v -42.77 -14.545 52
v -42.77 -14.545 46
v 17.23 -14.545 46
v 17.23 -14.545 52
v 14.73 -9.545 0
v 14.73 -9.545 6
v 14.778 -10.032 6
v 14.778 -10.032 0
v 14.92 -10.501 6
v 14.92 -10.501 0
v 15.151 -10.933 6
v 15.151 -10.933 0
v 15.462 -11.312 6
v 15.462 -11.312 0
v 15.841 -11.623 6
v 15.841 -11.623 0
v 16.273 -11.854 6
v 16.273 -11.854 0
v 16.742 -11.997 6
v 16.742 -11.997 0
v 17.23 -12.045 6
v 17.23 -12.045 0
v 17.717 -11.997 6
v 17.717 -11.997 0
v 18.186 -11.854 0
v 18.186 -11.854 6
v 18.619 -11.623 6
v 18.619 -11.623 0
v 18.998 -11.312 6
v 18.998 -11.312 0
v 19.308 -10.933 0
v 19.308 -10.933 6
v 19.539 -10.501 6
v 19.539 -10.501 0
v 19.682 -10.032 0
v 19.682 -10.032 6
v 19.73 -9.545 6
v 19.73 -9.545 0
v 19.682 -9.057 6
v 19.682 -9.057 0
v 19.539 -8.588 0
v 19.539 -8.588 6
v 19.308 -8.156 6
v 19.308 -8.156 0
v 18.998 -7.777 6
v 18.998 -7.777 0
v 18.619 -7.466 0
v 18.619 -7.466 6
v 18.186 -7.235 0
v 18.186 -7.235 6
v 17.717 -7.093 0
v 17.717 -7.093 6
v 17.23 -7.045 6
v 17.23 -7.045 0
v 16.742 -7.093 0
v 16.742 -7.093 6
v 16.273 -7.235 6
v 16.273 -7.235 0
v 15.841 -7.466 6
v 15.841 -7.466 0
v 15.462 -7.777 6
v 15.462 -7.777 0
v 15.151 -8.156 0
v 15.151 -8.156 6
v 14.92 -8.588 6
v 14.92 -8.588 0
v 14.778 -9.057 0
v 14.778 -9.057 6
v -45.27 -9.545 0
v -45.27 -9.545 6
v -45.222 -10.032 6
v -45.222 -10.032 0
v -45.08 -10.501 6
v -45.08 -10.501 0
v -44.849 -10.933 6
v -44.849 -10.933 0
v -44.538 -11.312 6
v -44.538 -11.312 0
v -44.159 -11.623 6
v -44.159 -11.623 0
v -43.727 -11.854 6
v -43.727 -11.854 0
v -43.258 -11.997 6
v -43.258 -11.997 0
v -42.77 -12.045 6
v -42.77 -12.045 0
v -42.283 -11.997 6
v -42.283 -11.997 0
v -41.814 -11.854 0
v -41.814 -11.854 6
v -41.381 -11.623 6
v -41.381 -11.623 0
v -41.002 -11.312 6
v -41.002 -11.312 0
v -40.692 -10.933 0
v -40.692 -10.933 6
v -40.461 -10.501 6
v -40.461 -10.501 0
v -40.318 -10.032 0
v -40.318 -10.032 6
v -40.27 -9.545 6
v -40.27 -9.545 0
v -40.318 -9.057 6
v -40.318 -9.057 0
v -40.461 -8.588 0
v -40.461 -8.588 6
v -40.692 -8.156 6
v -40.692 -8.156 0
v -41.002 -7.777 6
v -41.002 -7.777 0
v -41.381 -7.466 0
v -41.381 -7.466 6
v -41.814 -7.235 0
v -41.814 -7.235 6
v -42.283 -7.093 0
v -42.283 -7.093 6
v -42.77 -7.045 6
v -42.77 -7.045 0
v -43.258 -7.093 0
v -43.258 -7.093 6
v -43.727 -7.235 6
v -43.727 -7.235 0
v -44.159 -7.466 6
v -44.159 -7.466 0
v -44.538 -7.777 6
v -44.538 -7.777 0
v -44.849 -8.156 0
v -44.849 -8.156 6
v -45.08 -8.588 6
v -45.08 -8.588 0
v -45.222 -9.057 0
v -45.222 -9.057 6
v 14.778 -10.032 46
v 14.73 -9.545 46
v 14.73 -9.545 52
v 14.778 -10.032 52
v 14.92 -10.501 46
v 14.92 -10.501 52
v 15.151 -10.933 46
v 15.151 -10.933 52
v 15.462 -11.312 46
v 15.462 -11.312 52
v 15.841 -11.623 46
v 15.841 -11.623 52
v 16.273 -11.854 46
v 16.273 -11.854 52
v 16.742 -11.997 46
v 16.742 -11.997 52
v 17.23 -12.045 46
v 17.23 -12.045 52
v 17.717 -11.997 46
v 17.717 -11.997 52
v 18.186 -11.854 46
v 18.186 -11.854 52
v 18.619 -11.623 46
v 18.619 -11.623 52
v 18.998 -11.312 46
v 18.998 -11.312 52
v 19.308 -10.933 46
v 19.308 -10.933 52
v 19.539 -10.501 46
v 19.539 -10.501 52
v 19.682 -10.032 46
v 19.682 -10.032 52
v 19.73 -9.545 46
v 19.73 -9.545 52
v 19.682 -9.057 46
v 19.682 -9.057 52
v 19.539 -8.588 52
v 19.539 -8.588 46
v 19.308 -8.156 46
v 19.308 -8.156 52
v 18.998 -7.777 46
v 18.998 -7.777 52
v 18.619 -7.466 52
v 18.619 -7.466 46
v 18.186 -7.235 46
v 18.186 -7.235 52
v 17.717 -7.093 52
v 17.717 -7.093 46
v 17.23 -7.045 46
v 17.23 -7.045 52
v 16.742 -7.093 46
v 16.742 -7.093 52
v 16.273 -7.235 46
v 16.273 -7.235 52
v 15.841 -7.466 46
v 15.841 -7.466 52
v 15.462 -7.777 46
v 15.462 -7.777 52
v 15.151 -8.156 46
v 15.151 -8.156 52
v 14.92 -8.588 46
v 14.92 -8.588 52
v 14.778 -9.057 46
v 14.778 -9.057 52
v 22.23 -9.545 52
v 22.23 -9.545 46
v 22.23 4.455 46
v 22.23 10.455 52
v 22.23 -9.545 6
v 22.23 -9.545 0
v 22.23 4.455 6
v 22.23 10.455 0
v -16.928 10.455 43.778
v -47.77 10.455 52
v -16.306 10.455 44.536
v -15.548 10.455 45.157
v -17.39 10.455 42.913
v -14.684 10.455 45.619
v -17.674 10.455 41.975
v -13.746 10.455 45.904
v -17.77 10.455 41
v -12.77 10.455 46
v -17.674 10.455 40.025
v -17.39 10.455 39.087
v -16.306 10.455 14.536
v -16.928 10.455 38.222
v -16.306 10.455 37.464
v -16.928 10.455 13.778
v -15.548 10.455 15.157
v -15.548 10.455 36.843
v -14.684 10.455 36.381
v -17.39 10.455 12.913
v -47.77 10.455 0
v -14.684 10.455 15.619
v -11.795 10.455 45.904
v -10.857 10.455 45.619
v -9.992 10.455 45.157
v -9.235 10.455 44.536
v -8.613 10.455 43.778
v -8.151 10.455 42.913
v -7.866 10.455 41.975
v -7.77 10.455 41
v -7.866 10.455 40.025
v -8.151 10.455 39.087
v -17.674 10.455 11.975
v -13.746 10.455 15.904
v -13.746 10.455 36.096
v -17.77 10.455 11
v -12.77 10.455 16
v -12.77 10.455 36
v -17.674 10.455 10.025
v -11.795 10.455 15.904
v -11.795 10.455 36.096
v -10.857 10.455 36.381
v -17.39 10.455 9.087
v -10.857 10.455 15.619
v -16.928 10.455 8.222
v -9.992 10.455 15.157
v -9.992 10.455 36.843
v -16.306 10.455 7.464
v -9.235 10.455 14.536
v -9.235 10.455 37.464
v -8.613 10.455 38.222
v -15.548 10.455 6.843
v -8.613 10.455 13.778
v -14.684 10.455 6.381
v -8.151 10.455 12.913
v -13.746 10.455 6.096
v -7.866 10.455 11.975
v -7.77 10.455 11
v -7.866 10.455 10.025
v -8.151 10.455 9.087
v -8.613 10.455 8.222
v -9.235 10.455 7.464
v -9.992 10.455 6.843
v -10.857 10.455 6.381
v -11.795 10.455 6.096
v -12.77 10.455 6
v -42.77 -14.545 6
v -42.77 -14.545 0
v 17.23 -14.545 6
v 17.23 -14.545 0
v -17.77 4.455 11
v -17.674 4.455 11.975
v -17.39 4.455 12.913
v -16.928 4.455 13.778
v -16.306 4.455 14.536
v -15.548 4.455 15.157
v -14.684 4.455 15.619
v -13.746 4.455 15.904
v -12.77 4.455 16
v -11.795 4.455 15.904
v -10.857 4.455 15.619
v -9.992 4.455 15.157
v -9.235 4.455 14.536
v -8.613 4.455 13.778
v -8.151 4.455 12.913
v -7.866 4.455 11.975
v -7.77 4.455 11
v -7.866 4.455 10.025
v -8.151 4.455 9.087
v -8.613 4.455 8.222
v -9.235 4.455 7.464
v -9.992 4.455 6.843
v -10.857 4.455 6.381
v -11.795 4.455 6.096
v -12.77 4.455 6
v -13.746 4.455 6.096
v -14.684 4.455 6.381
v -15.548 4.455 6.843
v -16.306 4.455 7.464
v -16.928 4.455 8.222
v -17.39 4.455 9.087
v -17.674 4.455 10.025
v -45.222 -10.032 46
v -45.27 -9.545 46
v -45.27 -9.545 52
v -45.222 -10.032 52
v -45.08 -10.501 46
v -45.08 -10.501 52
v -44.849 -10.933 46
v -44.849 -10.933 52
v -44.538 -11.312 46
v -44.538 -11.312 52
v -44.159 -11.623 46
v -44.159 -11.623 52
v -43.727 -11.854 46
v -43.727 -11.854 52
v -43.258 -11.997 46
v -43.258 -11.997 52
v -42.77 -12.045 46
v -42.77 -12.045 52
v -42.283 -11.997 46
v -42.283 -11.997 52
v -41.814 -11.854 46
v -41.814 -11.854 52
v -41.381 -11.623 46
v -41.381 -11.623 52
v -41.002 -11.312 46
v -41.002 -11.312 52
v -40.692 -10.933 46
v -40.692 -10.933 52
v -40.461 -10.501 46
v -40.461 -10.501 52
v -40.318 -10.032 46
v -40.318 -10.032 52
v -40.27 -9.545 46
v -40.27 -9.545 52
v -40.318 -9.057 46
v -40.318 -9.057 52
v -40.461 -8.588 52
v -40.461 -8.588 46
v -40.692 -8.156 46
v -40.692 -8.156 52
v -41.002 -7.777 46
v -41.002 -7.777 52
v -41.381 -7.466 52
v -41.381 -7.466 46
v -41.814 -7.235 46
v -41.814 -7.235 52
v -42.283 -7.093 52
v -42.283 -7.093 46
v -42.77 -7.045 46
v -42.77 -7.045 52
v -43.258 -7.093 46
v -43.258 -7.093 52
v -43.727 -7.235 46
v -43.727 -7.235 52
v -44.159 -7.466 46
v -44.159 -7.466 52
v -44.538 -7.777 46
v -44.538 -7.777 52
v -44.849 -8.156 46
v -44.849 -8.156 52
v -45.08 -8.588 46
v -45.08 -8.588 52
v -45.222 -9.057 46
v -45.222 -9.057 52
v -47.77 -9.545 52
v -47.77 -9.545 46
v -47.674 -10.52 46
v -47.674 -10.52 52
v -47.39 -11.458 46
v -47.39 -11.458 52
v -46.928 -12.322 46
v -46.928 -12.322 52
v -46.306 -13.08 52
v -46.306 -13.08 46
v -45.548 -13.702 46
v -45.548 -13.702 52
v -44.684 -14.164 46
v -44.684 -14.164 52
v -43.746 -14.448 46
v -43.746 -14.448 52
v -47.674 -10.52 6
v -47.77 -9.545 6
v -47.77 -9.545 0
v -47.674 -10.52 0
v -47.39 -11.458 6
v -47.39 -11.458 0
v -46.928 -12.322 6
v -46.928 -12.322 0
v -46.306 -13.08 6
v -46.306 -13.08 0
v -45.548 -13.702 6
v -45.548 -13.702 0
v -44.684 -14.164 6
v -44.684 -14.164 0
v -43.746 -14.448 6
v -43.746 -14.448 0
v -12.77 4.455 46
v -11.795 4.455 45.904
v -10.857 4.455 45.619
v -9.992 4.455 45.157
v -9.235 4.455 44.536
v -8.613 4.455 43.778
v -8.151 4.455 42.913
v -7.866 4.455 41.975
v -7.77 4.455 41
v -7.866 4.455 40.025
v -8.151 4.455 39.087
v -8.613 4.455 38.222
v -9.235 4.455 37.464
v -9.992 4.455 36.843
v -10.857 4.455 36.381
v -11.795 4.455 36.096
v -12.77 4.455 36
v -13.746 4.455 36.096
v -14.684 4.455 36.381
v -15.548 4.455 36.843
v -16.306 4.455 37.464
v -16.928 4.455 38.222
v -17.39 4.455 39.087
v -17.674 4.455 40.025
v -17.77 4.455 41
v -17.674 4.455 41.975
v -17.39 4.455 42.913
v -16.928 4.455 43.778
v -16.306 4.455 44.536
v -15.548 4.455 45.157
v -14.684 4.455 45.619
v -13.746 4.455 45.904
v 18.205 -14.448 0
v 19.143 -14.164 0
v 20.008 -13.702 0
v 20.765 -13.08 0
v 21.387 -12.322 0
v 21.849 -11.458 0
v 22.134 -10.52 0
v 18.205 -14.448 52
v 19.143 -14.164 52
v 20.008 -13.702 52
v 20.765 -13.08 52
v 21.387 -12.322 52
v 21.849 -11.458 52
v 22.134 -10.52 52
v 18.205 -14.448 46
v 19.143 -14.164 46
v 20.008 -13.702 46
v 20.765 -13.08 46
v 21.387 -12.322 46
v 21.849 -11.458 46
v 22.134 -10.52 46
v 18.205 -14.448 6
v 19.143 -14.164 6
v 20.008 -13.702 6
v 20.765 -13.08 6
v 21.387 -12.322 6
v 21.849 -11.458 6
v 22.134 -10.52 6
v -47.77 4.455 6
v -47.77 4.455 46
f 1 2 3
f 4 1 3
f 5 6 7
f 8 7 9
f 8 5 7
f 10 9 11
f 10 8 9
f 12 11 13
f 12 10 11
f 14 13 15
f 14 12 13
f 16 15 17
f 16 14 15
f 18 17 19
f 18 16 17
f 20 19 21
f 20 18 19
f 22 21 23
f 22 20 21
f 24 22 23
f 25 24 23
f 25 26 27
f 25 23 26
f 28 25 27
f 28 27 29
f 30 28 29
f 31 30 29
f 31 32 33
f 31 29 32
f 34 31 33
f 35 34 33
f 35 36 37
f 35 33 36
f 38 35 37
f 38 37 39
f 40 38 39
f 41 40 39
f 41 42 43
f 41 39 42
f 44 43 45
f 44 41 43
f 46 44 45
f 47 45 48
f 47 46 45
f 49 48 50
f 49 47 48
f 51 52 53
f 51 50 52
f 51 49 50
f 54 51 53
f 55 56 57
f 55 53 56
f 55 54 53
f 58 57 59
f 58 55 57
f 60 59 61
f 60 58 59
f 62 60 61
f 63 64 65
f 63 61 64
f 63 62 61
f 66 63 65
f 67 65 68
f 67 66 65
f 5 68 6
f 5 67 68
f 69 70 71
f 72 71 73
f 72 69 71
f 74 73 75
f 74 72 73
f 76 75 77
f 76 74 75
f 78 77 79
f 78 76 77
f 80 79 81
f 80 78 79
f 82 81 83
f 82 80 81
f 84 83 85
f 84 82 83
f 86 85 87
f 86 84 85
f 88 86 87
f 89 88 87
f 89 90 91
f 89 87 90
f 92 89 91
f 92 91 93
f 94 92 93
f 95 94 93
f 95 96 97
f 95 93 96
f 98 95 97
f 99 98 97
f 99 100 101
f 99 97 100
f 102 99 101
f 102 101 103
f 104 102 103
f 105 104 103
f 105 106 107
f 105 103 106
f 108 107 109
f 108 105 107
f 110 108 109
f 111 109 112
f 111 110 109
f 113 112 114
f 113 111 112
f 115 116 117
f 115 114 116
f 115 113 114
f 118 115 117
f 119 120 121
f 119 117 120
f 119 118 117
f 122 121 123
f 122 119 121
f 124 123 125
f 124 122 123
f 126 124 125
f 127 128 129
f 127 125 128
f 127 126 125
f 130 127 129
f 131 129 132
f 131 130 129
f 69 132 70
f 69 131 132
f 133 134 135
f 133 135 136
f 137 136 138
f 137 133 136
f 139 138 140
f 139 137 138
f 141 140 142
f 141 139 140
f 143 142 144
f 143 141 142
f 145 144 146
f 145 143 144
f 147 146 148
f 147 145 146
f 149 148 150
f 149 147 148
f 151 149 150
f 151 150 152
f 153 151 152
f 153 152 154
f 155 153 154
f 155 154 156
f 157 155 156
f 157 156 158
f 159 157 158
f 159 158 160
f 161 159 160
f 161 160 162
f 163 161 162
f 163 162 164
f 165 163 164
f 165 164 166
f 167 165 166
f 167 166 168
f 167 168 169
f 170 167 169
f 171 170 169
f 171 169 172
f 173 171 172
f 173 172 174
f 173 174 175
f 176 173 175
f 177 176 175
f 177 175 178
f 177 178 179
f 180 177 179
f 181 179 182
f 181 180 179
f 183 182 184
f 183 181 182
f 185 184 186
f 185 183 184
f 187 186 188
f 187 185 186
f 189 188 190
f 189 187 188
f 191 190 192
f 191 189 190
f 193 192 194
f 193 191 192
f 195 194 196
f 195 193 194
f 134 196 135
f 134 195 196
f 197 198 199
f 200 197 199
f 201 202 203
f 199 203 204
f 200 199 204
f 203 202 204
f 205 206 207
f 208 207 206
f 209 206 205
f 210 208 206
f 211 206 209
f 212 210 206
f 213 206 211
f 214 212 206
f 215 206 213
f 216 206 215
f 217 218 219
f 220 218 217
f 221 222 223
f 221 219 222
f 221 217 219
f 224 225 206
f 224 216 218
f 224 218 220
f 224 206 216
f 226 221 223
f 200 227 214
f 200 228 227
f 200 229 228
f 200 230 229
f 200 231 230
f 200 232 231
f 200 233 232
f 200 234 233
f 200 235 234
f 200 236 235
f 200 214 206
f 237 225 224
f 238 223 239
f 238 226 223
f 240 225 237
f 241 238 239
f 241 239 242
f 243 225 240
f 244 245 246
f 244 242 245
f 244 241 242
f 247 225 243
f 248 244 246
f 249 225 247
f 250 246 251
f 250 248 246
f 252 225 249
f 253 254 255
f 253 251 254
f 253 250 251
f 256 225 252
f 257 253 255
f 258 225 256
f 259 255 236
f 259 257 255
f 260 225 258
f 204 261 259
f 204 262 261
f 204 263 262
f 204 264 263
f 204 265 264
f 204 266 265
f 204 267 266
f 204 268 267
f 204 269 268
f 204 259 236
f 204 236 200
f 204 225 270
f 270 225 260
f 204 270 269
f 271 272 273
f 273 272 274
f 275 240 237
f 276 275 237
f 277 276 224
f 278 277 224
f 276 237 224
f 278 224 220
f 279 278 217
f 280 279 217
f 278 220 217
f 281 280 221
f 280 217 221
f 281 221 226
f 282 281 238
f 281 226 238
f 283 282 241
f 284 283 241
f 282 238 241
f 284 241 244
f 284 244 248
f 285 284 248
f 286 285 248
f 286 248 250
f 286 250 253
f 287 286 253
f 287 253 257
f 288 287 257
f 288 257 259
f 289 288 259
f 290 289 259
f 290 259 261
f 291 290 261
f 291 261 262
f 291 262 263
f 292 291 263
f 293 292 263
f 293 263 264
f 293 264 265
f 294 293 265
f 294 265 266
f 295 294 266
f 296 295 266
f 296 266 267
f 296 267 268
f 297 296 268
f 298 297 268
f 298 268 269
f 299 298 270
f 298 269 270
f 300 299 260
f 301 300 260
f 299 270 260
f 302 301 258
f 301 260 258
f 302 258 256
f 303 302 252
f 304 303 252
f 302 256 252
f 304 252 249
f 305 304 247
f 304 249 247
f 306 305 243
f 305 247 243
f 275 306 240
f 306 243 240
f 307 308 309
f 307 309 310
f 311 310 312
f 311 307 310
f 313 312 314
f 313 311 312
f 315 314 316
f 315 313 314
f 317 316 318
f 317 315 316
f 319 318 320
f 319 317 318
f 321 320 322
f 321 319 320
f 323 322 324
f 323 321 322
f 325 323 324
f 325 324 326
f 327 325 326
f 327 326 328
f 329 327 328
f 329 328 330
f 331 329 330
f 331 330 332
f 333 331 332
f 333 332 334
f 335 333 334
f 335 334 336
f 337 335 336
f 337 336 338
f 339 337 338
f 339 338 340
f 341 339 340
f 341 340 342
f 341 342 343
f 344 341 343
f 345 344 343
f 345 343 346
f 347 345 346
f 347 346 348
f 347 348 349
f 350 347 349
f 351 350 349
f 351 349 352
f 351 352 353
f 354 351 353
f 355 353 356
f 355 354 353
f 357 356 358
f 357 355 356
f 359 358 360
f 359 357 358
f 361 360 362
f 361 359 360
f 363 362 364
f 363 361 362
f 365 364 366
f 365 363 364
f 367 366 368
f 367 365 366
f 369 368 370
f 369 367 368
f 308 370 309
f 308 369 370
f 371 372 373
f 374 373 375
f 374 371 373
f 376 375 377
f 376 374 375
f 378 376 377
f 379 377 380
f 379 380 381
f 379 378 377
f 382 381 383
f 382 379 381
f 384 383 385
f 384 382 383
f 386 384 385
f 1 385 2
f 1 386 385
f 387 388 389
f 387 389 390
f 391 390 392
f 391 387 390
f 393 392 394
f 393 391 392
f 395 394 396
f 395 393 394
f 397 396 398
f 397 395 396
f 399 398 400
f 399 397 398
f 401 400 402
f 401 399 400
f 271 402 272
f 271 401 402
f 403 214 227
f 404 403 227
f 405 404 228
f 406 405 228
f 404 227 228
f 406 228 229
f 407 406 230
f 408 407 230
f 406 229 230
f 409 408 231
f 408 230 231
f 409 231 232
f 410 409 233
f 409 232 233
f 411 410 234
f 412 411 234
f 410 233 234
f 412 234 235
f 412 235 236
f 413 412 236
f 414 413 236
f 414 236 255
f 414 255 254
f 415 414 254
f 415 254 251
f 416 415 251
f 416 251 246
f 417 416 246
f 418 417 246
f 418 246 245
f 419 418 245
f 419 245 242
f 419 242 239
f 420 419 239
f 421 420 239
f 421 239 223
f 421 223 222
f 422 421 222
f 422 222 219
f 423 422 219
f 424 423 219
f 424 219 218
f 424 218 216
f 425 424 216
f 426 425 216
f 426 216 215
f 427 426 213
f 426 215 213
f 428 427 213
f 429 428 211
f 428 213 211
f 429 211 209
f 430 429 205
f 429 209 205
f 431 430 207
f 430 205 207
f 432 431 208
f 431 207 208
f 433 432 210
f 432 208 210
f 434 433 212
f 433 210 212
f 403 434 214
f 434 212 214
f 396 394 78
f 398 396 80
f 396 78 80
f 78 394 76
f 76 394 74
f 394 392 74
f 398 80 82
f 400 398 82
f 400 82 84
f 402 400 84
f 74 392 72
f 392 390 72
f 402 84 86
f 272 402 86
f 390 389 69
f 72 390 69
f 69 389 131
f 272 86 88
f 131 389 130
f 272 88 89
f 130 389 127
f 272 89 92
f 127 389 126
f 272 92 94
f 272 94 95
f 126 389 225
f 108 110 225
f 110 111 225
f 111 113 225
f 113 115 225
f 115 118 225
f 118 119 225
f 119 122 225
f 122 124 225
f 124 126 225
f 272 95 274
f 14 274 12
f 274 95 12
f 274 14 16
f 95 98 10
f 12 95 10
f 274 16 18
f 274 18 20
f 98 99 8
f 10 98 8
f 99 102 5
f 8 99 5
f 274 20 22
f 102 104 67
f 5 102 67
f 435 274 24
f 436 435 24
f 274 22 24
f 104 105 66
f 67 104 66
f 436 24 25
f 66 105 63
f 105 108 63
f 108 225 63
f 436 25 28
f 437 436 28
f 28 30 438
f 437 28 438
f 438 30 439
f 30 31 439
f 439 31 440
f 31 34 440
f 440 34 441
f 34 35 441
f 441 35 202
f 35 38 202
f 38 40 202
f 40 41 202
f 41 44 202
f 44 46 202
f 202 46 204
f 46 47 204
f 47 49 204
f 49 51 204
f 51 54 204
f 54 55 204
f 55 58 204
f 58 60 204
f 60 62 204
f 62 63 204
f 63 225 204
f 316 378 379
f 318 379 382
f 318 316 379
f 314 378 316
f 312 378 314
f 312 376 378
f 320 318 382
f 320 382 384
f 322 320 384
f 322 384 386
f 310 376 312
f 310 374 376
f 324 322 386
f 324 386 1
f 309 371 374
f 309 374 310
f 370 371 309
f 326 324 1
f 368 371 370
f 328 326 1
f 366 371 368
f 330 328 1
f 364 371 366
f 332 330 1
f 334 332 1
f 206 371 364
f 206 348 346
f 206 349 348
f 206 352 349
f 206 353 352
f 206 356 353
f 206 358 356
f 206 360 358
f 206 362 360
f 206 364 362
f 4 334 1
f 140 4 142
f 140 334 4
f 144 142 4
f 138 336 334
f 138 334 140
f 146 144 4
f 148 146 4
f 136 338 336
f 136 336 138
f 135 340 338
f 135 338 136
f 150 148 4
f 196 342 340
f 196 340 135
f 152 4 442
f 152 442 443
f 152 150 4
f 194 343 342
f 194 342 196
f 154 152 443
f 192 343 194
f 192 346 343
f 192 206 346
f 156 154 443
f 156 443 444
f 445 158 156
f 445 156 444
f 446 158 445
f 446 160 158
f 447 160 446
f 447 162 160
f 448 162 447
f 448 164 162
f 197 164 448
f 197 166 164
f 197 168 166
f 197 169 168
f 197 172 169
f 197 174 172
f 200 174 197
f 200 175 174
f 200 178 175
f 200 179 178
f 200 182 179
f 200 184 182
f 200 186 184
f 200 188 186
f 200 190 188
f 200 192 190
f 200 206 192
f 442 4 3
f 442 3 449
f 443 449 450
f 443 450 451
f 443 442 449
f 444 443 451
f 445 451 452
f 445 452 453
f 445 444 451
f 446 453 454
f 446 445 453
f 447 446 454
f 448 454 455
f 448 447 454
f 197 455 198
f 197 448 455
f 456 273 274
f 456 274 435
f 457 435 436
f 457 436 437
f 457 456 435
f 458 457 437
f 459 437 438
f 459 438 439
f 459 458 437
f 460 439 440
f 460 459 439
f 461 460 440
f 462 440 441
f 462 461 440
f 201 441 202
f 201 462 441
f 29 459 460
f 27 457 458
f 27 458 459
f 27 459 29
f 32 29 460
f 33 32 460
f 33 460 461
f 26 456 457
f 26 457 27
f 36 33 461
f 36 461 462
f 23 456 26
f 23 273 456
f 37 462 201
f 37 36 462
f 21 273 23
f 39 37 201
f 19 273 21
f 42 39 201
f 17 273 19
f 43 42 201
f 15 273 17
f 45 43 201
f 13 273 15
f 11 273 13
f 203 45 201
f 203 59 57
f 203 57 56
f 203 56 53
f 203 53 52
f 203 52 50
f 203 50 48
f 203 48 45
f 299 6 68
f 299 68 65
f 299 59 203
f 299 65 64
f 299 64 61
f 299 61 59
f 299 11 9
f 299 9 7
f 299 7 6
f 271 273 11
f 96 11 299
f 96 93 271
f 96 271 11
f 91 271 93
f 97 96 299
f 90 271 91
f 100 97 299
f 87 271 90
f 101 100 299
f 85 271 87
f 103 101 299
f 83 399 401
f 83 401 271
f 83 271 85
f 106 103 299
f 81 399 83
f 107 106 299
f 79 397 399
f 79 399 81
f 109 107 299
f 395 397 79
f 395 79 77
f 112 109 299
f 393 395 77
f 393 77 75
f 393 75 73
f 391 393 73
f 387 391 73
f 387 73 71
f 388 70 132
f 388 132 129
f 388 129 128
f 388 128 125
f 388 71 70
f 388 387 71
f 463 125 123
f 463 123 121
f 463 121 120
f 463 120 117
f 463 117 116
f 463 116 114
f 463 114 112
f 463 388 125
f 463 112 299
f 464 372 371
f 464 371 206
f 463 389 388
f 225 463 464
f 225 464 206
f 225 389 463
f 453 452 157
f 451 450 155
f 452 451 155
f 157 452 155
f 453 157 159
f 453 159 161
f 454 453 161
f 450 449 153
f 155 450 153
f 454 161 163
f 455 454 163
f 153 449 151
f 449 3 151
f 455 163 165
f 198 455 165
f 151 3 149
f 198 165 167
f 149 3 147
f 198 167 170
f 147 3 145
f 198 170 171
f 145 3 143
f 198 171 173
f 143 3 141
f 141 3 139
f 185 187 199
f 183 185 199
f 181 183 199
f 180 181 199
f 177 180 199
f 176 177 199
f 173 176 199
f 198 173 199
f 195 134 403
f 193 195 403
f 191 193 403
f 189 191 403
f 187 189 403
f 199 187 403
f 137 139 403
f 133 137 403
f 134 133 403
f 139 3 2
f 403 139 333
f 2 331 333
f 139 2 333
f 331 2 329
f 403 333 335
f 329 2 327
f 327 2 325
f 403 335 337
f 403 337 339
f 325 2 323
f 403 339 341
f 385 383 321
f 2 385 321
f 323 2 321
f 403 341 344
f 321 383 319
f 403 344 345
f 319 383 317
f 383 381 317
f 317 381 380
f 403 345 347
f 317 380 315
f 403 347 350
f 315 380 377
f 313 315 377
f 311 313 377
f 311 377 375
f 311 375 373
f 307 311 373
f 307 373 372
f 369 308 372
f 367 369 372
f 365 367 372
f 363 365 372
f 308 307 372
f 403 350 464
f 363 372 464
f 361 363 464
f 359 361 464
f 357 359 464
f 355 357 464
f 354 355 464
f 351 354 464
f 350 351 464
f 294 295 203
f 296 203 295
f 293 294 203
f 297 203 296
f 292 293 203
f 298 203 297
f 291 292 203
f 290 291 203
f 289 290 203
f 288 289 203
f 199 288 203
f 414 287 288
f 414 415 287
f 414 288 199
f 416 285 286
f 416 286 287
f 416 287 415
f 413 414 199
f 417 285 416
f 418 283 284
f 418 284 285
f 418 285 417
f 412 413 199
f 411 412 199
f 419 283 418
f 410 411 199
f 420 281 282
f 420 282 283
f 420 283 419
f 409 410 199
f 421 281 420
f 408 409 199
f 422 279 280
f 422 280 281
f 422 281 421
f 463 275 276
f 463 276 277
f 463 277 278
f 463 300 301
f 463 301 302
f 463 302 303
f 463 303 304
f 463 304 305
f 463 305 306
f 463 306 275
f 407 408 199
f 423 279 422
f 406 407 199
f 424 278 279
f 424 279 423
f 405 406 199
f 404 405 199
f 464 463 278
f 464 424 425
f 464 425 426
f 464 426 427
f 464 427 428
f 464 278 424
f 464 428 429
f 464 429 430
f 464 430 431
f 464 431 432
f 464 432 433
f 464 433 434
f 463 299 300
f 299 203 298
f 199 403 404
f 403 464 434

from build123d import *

# Parameters (mm, degrees)
SKETCH_1_W          = 70
SKETCH_1_H          = 25
SKETCH_1_R          = 2.5
EXTRUDE_1_DEPTH     = 52
FILLET_6_R          = 5
FILLET_7_R          = 5
SKETCH_2_W          = 40
SKETCH_2_H          = 19
CUT_EXTRUDE_2_DEPTH = 89.405565637
SKETCH_3_R          = 5
CUT_EXTRUDE_3_DEPTH = 75.906573986


with BuildPart() as part:
    # 草图1 → 凸台-拉伸1 (new body)
    with BuildSketch(Plane.XY):
        with Locations((-12.770229498, -2.044553468)):
            Rectangle(SKETCH_1_W, SKETCH_1_H)
        with Locations(Location((-42.770229498, -9.544553468, 0), (0, 0, 180))):
            Circle(SKETCH_1_R, mode=Mode.SUBTRACT)
        with Locations(Location((17.229770502, -9.544553468, 0), (0, 0, 180))):
            Circle(SKETCH_1_R, mode=Mode.SUBTRACT)
    extrude(amount=EXTRUDE_1_DEPTH)

    # 圆角6
    fillet_6_edges = [part.edges().sort_by_distance(p)[0] for p in [
        (-47.770229498, -14.544553468, 26),
    ]]
    fillet(fillet_6_edges, radius=FILLET_6_R)

    # 圆角7
    fillet_7_edges = [part.edges().sort_by_distance(p)[0] for p in [
        (22.229770502, -14.544553468, 26),
    ]]
    fillet(fillet_7_edges, radius=FILLET_7_R)

    # 草图2 → 切除-拉伸2 (cut, through all)
    with BuildSketch(Plane.ZY.offset(47.770229498)):
        with Locations((26, -5.044553468)):
            Rectangle(SKETCH_2_W, SKETCH_2_H)
    extrude(amount=-CUT_EXTRUDE_2_DEPTH, mode=Mode.SUBTRACT)

    # 草图3 → 切除-拉伸3 (cut, through all)
    with BuildSketch(Plane(origin=(0, 10.455446532, 0), x_dir=(1, 0, 0), z_dir=(0, 1, 0))):
        with Locations(Location((-12.770229498, -11, 0), (0, 0, 180))):
            Circle(SKETCH_3_R)
        with Locations(Location((-12.770229498, -41, 0), (0, 0, 270))):
            Circle(SKETCH_3_R)
    extrude(amount=-CUT_EXTRUDE_3_DEPTH, mode=Mode.SUBTRACT)


solid = part.part
